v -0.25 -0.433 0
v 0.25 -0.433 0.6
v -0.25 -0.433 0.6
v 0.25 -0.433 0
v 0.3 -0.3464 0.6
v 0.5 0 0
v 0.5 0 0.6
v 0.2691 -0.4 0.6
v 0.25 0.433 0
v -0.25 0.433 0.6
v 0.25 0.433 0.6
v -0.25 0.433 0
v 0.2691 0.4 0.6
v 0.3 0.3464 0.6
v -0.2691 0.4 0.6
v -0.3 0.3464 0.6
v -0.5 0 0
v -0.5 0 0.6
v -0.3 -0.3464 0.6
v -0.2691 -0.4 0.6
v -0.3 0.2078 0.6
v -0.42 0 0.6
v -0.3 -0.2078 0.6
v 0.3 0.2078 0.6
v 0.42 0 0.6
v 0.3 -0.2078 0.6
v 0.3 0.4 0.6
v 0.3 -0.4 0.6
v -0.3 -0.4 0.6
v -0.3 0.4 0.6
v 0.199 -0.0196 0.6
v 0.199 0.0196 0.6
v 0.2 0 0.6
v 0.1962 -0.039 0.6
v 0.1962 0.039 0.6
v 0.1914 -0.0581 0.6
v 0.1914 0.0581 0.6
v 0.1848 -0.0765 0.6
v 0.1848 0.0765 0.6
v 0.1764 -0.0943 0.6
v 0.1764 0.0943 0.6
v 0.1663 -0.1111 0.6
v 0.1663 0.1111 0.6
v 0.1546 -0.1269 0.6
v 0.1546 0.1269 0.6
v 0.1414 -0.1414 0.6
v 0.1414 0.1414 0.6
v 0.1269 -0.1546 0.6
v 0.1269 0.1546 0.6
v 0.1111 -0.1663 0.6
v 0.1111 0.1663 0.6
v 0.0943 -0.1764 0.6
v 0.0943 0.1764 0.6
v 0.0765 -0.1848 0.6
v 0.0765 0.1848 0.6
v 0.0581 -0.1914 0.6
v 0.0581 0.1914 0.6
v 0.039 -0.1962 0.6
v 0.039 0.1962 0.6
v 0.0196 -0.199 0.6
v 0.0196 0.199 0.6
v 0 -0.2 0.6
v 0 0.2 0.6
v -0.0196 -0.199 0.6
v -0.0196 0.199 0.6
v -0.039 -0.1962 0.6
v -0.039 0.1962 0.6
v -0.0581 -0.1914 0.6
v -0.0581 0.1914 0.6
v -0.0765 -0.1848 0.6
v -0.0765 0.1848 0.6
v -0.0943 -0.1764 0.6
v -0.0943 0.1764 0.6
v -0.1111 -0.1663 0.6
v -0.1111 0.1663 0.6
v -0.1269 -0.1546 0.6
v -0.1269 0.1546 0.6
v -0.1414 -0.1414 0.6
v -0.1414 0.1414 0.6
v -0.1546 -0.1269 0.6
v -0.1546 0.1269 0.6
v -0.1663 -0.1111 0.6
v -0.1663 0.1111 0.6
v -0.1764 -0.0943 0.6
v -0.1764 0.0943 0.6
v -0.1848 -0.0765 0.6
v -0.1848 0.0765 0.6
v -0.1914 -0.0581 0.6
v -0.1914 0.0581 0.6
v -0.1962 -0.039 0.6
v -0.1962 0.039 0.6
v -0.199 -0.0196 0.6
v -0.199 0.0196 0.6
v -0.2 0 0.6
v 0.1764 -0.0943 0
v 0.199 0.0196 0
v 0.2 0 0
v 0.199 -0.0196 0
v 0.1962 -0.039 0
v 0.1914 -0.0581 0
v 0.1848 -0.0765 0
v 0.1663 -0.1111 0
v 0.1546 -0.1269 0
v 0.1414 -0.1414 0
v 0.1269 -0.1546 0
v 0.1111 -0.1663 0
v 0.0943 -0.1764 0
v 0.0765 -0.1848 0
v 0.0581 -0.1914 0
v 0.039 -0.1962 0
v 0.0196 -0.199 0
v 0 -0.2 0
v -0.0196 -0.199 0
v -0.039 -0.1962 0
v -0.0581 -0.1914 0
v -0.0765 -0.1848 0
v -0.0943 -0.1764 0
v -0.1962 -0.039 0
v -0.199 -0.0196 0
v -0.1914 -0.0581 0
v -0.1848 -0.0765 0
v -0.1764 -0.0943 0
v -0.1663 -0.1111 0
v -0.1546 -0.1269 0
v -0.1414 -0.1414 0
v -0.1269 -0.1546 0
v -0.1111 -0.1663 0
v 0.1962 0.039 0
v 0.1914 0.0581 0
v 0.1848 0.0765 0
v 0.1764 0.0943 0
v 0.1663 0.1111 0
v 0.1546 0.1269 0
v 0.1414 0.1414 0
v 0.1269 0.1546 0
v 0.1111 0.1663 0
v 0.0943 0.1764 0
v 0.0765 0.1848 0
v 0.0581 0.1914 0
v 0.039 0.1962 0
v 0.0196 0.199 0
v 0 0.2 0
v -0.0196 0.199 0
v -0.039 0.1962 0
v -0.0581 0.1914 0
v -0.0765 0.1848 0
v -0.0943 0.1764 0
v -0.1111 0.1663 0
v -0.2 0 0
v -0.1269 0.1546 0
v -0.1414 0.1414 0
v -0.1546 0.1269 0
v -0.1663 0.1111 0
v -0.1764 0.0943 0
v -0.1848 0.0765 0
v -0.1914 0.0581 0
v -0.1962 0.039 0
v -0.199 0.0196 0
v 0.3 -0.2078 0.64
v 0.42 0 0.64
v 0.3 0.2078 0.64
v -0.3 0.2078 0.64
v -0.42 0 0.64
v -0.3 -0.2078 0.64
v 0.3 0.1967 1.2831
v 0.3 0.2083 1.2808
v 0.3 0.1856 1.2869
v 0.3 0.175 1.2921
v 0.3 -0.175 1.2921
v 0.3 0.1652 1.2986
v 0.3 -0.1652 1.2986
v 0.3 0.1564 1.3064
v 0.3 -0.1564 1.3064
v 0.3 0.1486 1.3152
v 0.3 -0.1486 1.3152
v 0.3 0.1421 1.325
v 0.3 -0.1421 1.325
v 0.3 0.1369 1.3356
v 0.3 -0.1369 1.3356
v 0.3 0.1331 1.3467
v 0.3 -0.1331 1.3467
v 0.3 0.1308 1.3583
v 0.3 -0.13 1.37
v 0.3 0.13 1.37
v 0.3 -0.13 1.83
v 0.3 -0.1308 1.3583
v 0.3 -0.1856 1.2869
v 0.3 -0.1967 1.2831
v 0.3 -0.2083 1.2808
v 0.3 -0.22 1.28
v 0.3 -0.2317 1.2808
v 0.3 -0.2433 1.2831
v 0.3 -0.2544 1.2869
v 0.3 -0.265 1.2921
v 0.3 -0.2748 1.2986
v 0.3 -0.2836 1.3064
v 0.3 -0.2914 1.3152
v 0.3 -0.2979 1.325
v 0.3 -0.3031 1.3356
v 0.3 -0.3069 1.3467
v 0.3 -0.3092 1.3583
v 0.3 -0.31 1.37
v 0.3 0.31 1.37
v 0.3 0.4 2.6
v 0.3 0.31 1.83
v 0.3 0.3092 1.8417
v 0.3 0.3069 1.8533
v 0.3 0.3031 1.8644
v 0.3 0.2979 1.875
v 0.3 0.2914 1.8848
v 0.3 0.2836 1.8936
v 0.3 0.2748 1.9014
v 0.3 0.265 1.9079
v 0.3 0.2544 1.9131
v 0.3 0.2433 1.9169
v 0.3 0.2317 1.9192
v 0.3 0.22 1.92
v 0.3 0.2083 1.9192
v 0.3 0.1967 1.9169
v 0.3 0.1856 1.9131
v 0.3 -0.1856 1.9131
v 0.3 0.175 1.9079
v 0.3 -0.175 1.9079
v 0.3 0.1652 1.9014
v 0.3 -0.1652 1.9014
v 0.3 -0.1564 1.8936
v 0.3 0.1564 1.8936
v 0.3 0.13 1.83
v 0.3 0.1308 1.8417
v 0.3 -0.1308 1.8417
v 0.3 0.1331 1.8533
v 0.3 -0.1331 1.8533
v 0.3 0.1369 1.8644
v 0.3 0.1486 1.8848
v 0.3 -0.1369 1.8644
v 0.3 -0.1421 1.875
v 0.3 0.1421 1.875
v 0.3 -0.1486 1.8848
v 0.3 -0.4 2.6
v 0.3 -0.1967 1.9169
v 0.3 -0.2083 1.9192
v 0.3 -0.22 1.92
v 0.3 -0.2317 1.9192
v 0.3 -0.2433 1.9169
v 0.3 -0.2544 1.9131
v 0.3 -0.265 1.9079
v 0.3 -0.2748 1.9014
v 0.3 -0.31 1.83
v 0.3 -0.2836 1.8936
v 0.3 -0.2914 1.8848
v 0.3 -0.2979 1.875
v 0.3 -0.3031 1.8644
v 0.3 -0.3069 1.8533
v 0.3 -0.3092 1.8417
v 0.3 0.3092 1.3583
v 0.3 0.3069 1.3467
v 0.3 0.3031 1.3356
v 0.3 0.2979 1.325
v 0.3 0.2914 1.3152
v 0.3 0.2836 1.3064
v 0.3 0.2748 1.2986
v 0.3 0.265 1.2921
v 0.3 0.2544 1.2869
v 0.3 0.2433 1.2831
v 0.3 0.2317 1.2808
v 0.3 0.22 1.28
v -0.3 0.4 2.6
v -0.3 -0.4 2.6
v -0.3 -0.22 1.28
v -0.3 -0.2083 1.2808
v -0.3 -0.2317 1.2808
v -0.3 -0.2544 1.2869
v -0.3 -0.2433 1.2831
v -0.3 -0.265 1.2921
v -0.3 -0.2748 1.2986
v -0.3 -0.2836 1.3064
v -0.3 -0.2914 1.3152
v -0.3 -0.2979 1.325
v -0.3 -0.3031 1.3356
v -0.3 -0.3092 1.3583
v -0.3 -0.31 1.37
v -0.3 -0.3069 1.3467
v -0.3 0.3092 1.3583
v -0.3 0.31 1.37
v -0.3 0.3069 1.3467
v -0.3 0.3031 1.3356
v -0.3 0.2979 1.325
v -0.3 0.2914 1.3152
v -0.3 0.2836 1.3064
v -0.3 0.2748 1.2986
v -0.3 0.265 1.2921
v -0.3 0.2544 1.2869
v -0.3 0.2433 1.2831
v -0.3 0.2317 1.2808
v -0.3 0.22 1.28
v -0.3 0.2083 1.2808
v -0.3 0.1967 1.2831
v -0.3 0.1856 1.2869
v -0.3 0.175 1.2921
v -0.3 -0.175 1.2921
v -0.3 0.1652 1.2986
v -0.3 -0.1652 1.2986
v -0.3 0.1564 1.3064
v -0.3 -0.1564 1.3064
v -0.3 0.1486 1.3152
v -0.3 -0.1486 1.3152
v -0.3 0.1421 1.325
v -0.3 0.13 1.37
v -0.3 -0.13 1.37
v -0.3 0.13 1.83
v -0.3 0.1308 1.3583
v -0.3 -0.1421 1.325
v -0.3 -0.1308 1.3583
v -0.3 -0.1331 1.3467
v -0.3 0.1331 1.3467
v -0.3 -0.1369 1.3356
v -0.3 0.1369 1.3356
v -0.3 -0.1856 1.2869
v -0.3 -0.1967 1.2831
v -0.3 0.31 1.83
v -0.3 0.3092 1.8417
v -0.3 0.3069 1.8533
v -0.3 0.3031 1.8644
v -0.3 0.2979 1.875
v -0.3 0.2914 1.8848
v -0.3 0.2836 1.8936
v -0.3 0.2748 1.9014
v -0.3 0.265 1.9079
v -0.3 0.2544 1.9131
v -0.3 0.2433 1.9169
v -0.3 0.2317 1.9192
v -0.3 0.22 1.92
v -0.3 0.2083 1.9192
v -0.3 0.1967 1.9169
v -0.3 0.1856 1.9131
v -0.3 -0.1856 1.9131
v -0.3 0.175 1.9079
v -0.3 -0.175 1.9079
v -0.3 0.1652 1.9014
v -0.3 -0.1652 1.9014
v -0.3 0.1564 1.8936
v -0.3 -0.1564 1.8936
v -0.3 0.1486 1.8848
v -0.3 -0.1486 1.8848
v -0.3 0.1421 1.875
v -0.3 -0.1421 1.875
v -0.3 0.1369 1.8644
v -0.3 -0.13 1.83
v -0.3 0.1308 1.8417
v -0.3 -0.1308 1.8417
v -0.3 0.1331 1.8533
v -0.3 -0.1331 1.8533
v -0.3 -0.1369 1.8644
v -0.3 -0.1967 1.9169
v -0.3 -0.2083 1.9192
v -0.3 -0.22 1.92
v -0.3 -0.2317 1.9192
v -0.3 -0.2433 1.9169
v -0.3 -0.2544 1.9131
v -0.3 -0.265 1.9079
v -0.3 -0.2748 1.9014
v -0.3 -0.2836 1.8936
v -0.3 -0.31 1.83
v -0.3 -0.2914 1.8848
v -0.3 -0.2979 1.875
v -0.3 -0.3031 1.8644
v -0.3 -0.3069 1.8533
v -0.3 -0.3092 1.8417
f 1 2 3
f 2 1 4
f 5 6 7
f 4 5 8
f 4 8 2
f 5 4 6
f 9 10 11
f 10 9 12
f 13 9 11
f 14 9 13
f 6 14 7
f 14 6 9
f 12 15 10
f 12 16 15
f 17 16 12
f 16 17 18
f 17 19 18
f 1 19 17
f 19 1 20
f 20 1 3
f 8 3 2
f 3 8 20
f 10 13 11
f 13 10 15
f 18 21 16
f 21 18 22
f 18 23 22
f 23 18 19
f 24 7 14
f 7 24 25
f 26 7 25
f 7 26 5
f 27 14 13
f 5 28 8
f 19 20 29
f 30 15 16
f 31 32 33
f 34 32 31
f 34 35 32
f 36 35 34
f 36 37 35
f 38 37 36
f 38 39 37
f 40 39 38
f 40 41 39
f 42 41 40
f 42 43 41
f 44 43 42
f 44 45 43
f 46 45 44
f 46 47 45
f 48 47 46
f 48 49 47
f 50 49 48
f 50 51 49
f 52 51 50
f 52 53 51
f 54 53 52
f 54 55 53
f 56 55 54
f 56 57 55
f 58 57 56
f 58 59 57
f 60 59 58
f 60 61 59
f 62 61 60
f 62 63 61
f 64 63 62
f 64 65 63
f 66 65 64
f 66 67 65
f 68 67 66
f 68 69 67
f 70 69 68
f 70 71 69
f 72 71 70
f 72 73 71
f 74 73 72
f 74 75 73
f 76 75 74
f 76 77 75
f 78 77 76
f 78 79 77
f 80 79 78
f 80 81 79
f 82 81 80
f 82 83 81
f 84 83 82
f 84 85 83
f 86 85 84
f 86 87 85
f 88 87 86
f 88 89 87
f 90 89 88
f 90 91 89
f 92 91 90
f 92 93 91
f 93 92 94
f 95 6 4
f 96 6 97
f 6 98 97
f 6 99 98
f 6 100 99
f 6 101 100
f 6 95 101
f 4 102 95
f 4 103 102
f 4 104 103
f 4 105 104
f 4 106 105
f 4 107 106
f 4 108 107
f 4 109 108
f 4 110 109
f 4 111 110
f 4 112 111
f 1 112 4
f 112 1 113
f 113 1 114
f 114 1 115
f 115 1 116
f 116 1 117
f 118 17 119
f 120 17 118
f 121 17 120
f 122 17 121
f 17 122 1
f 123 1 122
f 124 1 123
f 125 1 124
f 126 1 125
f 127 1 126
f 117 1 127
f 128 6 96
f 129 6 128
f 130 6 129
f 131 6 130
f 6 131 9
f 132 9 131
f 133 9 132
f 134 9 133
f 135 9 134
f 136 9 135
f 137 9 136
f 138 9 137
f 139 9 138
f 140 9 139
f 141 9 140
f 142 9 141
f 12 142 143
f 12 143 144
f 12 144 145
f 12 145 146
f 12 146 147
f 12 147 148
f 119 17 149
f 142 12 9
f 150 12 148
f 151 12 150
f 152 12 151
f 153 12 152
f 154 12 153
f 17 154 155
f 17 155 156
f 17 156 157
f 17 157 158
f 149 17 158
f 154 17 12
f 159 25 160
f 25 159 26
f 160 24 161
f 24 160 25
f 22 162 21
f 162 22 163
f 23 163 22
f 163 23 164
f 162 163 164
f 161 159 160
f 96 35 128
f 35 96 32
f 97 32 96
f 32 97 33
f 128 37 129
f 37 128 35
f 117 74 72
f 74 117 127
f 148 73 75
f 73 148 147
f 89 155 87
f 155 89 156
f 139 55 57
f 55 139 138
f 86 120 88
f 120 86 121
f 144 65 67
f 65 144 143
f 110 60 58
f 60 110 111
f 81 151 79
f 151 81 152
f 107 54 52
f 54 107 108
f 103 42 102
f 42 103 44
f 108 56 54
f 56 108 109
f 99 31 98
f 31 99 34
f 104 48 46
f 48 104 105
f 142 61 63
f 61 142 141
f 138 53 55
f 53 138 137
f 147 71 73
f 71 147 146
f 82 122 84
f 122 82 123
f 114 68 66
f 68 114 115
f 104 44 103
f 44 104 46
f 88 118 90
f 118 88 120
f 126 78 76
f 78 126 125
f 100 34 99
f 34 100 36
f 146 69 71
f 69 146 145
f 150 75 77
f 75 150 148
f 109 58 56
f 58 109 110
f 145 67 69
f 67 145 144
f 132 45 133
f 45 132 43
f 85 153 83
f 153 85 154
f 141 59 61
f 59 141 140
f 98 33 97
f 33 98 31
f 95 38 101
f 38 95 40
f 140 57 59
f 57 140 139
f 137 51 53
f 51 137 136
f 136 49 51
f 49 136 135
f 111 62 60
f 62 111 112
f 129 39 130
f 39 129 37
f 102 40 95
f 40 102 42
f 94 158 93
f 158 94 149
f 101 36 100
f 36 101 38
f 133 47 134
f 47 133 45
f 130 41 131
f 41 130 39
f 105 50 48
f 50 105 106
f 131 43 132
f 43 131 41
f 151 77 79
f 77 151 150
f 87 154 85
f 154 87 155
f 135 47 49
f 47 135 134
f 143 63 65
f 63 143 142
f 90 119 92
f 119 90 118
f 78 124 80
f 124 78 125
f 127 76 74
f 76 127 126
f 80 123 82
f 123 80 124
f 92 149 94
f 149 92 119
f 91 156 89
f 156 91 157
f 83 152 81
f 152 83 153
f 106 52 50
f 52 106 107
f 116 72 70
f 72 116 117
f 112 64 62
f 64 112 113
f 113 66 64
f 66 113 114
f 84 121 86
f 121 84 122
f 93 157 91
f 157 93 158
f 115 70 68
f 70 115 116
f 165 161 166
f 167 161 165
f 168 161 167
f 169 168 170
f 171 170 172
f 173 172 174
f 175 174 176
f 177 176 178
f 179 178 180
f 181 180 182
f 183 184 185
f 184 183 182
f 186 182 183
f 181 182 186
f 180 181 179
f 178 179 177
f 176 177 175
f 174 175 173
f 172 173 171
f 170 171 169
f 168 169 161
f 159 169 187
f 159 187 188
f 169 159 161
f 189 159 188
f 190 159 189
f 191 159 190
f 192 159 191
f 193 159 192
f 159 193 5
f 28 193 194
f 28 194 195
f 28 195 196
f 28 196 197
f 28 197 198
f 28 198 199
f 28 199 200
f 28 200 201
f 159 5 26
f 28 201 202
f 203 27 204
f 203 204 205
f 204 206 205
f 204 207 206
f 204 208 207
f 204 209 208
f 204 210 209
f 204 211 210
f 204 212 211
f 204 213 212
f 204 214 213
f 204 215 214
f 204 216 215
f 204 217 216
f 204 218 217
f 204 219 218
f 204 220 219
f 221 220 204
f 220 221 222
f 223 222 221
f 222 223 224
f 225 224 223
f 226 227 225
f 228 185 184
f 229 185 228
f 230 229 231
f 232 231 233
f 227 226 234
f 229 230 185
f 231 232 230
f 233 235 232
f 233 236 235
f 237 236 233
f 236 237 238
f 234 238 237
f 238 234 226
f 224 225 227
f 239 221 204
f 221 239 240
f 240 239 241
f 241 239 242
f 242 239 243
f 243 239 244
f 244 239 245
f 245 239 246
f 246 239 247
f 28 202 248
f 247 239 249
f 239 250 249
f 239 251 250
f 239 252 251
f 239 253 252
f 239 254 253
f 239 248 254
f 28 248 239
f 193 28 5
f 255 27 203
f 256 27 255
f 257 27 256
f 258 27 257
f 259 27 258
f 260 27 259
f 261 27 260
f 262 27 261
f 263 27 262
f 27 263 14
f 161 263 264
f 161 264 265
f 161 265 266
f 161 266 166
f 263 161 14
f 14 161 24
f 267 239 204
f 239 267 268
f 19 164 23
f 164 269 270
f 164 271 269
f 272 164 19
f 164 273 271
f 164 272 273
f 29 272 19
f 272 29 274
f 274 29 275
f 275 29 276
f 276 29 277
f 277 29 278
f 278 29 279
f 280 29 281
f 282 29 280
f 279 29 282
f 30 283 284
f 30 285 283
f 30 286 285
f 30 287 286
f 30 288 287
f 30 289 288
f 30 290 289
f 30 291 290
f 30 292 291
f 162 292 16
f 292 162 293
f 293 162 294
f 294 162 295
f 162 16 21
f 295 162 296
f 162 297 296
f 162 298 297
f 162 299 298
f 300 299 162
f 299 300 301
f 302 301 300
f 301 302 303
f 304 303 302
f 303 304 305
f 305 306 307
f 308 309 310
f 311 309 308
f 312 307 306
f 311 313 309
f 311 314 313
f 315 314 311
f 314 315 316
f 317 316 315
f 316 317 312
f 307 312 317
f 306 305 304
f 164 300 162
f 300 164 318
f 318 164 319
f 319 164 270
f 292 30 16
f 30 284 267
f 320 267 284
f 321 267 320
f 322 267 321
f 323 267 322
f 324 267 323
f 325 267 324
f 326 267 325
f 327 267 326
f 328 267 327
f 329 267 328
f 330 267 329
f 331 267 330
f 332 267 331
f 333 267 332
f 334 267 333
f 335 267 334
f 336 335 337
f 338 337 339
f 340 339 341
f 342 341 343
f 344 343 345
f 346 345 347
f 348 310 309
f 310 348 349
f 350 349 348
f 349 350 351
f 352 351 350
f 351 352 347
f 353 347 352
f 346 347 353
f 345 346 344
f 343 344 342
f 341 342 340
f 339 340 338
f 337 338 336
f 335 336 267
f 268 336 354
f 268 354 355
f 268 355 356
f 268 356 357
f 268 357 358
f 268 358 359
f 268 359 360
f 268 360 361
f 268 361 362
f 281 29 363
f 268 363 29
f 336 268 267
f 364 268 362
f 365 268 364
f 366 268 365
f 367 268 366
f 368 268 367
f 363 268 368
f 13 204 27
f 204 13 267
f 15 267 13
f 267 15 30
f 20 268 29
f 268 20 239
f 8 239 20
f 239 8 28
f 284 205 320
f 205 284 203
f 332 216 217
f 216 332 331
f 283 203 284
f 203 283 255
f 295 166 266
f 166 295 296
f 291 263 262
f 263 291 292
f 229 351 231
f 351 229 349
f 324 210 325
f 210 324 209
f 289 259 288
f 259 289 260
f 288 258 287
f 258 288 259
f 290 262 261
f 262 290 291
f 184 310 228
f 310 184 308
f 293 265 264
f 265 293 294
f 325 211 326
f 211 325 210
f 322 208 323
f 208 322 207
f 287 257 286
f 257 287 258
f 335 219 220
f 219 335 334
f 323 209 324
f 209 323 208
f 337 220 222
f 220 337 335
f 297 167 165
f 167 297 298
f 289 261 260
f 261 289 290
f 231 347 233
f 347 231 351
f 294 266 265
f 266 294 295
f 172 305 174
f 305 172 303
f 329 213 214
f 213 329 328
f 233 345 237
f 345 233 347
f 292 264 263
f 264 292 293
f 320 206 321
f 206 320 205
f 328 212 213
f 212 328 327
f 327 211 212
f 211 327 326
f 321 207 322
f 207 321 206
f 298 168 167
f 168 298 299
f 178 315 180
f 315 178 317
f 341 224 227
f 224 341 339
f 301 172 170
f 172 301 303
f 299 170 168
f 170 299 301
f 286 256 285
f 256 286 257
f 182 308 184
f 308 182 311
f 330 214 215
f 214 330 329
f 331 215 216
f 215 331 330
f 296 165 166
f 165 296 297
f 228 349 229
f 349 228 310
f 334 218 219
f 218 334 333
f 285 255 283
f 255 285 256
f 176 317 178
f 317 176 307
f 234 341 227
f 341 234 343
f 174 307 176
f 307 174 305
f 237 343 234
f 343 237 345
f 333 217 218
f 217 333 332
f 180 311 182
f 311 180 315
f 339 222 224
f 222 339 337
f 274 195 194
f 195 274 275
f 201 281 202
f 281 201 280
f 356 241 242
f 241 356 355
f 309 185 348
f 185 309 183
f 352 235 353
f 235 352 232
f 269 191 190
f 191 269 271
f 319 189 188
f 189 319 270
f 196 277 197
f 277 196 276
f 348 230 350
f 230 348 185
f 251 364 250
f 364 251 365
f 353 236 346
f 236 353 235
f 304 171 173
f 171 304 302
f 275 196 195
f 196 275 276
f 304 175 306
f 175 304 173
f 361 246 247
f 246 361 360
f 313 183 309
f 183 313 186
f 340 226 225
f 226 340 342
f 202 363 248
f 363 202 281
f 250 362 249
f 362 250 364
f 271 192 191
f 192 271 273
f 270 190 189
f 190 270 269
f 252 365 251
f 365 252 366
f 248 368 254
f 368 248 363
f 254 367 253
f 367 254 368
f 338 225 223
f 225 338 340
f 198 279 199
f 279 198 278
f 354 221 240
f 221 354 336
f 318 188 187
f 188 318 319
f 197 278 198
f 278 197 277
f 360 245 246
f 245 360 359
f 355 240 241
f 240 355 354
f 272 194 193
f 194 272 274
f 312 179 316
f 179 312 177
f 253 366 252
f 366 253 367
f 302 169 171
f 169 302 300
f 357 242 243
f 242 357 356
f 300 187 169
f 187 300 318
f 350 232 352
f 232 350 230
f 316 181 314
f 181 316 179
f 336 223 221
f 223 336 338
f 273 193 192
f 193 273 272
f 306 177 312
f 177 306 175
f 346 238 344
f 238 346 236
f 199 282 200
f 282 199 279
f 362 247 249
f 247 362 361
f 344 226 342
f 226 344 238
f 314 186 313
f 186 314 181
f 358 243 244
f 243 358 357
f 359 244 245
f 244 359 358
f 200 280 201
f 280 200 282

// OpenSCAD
$fn=64;

scale([0.1,0.1,0.1]) fitting();

module fitting() {
    union() {
        collar();
        translate([0,0,6]) shank();
    }
}

module collar() {
    difference() {
        union() {
            cylinder(h=6, r=5, $fn=6);
            translate([0,0,5.2]) cylinder(h=1.2, r=4.2, $fn=6);
        }
        translate([0,0,-0.5]) cylinder(h=7.5, r=2.0, $fn=64);
    }
}

module shank() {
    difference() {
        union() {
            translate([0,0,10]) cube([6,8,20], center=true);
            rib();
        }
        slot_pair();
    }
}

module rib() {
    translate([0,0,10]) cube([1.2,8,20], center=true);
}

module slot_pair() {
    translate([0,0,10]) {
        translate([0, 2.2, 0]) rotate([0,90,0]) capsule_x(len=4.6, r=0.9, h=6.6);
        translate([0,-2.2, 0]) rotate([0,90,0]) capsule_x(len=4.6, r=0.9, h=6.6);
    }
}

module capsule_x(len=4.6, r=0.9, h=6.6) {
    linear_extrude(height=h, center=true)
        hull() {
            translate([-len/2,0]) circle(r=r, $fn=48);
            translate([ len/2,0]) circle(r=r, $fn=48);
        }
}
